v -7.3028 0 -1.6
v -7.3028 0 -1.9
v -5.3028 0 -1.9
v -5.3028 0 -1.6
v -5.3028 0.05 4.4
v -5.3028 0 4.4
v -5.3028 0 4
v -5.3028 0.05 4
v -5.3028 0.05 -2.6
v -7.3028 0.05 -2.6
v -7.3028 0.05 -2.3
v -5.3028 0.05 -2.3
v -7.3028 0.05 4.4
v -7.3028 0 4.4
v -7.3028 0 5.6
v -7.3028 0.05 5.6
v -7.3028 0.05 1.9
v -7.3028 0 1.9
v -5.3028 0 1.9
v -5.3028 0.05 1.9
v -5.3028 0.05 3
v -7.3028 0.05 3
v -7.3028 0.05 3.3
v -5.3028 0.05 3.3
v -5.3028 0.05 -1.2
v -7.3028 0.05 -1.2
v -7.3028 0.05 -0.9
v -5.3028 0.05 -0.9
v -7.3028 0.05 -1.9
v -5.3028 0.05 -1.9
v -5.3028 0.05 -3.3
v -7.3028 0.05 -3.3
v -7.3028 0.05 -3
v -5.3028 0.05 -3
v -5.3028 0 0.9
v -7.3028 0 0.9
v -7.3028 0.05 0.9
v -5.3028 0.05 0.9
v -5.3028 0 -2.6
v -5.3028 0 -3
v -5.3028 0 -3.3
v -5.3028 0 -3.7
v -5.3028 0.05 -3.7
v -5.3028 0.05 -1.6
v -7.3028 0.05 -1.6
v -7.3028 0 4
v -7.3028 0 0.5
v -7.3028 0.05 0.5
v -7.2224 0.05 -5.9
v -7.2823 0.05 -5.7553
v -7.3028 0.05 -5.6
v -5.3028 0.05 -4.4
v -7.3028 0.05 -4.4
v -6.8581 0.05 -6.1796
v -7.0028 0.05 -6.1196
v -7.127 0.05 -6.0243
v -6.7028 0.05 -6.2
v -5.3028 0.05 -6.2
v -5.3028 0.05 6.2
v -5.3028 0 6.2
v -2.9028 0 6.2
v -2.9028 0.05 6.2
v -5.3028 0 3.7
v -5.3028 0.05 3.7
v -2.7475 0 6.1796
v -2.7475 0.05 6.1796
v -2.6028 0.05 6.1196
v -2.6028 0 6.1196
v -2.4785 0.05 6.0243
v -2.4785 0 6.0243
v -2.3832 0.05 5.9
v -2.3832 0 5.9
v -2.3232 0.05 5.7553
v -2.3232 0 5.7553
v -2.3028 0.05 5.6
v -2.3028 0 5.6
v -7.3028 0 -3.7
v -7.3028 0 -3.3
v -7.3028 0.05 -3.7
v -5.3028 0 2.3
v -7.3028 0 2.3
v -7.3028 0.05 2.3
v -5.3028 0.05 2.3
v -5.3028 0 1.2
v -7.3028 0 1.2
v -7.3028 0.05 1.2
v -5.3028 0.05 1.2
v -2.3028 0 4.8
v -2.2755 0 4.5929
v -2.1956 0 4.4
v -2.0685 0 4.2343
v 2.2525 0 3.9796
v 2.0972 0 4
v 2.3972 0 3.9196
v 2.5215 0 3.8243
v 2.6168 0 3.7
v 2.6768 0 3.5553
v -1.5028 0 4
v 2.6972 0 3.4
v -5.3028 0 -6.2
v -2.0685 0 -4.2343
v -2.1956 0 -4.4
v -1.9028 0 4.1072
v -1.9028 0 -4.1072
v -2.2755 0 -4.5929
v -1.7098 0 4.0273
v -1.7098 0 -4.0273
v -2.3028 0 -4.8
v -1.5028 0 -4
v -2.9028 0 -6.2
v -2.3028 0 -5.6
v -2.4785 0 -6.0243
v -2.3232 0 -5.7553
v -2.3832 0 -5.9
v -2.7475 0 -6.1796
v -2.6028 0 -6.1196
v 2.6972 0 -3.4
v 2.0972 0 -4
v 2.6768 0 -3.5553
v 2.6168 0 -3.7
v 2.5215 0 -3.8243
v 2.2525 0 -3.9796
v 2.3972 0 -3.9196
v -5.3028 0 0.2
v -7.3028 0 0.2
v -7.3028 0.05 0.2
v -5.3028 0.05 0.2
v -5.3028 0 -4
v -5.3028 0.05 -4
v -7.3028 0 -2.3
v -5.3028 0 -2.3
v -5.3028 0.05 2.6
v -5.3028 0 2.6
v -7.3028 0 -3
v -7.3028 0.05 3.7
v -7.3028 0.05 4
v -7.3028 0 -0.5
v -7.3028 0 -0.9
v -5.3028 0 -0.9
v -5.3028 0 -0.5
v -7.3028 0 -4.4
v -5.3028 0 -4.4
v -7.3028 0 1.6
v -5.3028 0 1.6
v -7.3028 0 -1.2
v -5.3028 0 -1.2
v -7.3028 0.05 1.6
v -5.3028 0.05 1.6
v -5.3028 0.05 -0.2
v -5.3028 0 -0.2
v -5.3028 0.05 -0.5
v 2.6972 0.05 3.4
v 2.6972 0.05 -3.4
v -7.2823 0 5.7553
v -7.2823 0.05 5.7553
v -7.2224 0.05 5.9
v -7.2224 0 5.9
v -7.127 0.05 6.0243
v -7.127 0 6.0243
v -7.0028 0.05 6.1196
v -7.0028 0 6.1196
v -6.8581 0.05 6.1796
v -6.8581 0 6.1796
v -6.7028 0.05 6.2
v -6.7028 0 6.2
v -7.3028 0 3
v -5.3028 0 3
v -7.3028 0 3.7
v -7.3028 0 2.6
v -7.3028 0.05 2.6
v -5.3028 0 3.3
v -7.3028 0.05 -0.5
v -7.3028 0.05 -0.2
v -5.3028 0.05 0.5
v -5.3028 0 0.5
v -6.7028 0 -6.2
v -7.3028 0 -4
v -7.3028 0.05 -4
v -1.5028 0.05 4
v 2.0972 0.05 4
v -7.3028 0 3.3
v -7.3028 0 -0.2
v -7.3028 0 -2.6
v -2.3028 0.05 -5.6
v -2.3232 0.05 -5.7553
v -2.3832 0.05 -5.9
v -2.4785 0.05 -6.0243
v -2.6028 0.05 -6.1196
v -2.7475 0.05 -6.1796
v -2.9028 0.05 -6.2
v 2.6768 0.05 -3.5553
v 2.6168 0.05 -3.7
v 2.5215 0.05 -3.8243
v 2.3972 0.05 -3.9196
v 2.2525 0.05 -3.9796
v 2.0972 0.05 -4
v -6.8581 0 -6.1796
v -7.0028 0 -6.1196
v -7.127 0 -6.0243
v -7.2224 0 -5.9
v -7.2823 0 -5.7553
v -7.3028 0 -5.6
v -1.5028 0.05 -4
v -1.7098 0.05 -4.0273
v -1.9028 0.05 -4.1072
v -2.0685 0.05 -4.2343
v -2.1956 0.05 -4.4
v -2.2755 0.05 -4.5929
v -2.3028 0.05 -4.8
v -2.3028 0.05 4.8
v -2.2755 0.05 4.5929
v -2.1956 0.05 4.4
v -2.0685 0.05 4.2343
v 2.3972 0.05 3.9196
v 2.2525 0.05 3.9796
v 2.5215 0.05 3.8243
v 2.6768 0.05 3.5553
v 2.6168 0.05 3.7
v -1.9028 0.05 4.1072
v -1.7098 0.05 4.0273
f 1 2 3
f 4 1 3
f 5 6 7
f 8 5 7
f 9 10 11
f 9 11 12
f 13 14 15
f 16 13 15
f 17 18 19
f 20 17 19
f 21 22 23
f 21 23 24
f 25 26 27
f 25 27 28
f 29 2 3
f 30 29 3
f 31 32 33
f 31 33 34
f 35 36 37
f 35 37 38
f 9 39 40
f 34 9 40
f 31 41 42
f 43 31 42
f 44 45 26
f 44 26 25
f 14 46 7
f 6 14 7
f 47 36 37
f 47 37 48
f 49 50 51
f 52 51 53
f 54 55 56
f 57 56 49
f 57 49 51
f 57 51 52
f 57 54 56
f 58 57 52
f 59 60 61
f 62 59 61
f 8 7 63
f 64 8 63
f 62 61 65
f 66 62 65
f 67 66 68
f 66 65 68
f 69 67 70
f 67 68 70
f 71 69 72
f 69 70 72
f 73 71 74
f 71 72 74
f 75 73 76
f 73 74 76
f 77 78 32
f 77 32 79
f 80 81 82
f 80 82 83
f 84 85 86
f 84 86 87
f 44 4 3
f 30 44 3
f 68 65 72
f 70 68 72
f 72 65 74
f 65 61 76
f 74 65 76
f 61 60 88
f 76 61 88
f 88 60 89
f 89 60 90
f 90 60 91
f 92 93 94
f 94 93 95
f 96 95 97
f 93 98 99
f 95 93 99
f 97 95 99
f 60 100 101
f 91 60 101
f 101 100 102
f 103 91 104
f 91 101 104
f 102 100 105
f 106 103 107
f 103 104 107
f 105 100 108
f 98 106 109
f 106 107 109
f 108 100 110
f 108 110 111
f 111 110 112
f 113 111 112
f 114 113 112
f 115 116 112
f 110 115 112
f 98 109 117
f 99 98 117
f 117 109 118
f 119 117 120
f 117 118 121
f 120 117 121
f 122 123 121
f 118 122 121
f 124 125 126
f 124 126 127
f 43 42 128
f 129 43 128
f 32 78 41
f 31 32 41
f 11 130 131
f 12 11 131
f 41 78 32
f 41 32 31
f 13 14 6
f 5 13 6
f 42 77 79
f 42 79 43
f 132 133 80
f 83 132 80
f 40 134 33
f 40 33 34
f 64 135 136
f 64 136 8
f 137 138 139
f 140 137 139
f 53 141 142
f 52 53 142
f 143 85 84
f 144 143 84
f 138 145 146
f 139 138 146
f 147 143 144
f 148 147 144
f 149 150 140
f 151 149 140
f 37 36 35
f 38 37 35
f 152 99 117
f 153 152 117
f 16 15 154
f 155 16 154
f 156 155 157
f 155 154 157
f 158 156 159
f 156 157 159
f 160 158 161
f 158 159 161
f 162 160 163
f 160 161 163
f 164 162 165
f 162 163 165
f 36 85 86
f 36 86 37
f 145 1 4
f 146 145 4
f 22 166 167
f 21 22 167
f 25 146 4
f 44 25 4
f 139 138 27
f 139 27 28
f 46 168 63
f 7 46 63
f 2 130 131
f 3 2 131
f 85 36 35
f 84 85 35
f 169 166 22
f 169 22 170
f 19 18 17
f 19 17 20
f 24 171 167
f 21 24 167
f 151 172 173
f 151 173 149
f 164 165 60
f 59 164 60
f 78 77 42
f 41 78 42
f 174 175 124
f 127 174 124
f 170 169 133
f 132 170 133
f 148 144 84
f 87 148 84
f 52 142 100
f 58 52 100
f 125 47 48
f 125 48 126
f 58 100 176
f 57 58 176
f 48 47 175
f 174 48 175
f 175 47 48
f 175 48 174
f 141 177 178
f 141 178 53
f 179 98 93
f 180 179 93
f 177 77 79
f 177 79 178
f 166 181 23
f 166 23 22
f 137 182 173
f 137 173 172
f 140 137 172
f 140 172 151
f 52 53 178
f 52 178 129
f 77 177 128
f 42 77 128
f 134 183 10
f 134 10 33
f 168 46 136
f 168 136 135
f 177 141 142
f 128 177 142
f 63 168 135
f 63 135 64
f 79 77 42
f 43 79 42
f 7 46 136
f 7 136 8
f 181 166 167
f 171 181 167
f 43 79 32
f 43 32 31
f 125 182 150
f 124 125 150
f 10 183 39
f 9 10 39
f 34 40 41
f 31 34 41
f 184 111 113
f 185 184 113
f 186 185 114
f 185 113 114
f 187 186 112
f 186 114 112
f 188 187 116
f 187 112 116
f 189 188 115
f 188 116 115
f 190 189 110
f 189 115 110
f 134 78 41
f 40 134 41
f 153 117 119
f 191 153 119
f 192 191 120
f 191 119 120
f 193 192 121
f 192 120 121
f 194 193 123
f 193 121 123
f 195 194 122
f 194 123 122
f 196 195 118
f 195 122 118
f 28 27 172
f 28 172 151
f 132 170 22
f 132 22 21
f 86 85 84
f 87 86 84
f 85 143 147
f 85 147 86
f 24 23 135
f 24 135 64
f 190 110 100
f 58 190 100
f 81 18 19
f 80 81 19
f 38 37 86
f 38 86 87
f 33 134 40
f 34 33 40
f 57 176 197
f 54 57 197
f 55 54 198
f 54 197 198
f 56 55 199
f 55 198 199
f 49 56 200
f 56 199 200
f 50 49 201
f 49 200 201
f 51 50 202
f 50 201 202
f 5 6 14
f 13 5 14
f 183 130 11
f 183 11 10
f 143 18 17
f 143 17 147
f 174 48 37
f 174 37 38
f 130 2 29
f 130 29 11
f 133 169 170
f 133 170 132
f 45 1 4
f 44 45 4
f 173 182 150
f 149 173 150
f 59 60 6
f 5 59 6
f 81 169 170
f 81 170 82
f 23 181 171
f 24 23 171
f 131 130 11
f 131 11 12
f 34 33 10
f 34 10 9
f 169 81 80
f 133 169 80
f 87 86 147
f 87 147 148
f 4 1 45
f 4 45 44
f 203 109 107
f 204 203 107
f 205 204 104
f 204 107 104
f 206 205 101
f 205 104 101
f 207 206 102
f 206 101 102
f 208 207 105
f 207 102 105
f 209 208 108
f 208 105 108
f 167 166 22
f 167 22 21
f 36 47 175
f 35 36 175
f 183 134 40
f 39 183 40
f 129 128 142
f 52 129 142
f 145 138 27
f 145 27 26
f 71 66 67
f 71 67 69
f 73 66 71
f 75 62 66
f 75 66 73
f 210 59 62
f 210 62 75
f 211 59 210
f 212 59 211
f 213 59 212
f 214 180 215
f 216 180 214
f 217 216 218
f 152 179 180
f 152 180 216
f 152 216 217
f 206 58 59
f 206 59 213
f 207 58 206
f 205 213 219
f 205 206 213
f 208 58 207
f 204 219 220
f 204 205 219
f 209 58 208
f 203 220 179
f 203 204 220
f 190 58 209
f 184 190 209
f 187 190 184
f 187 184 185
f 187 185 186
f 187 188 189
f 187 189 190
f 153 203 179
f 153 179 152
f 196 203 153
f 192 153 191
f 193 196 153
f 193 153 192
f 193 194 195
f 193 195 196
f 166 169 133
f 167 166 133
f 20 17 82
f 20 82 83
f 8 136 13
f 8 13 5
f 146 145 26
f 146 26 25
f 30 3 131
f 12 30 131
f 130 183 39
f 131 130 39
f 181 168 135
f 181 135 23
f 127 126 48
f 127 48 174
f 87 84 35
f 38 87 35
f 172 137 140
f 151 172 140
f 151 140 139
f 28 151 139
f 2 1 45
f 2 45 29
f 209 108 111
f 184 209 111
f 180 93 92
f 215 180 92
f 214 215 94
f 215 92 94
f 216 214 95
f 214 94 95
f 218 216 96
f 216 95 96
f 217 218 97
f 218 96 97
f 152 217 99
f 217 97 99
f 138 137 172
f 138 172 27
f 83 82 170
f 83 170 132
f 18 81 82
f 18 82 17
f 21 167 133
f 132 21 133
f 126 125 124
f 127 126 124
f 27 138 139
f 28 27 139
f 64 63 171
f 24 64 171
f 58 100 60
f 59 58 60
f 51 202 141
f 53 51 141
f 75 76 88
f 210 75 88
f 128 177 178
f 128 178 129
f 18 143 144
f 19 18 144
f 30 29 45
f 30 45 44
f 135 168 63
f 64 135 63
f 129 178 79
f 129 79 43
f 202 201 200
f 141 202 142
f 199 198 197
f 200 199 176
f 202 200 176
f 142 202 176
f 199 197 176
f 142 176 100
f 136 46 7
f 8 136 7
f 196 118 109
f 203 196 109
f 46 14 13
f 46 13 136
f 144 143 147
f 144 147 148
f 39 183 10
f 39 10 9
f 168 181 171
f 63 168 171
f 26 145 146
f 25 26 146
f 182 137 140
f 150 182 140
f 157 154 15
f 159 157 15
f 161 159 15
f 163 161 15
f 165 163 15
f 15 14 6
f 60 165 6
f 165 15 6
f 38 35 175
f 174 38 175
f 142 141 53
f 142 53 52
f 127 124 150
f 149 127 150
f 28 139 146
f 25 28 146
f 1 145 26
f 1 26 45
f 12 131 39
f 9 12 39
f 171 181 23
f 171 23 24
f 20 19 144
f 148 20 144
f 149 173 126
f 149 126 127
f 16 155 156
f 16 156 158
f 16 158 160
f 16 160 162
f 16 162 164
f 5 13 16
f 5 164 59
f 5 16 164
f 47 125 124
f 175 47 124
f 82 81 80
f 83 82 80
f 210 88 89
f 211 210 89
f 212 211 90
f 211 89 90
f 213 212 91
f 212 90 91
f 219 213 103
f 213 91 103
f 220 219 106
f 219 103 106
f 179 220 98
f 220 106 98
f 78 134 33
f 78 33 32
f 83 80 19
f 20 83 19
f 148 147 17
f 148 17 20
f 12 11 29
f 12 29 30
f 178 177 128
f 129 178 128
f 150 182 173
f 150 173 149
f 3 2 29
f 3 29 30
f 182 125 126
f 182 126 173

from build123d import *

# Parameters (mm, degrees)
EXTRUDE_1_DEPTH    = 0.05
SKETCH_1_3_W       = 2
SKETCH_1_3_H       = 0.4
EXTRUDE_2_DEPTH    = 0.05
EXTRUDE_2_2_DEPTH  = 0.05
EXTRUDE_2_3_DEPTH  = 0.05
EXTRUDE_2_4_DEPTH  = 0.05
EXTRUDE_2_5_DEPTH  = 0.05
EXTRUDE_2_6_DEPTH  = 0.05
EXTRUDE_2_7_DEPTH  = 0.05
EXTRUDE_2_8_DEPTH  = 0.05
EXTRUDE_2_9_DEPTH  = 0.05
EXTRUDE_2_10_DEPTH = 0.05
EXTRUDE_2_11_DEPTH = 0.05
EXTRUDE_2_12_DEPTH = 0.05
EXTRUDE_2_13_DEPTH = 0.05
EXTRUDE_3_DEPTH    = 0.05
SKETCH_1_5_W       = 2
SKETCH_1_5_H       = 0.3
EXTRUDE_3_2_DEPTH  = 0.05
EXTRUDE_3_3_DEPTH  = 0.05
EXTRUDE_3_4_DEPTH  = 0.05
EXTRUDE_3_5_DEPTH  = 0.05
EXTRUDE_3_6_DEPTH  = 0.05
EXTRUDE_3_7_DEPTH  = 0.05
EXTRUDE_3_8_DEPTH  = 0.05
EXTRUDE_3_9_DEPTH  = 0.05
EXTRUDE_3_10_DEPTH = 0.05
EXTRUDE_3_11_DEPTH = 0.05
EXTRUDE_3_12_DEPTH = 0.05
EXTRUDE_3_13_DEPTH = 0.05
EXTRUDE_3_14_DEPTH = 0.05


with BuildPart() as part:
    # 草图1 → 凸台-拉伸1 (new body)
    with BuildSketch(Plane(origin=(0, 0, 0), x_dir=(1, 0, 0), z_dir=(0, 1, 0))):
        with BuildLine():
            Line((-5.302780917, 1.2), (-5.302780917, 0.9))
            Line((-5.302780917, 0.9), (-5.302780917, 0.5))
            Line((-5.302780917, 0.5), (-5.302780917, 0.2))
            Line((-5.302780917, 0.2), (-5.302780917, -0.2))
            Line((-5.302780917, -0.2), (-5.302780917, -0.5))
            Line((-5.302780917, -0.5), (-5.302780917, -0.9))
            Line((-5.302780917, -0.9), (-5.302780917, -1.2))
            Line((-5.302780917, -1.2), (-5.302780917, -1.6))
            Line((-5.302780917, -1.6), (-5.302780917, -1.9))
            Line((-5.302780917, -1.9), (-5.302780917, -2.3))
            Line((-5.302780917, -2.3), (-5.302780917, -2.6))
            Line((-5.302780917, -2.6), (-5.302780917, -3))
            Line((-5.302780917, -3), (-5.302780917, -3.3))
            Line((-5.302780917, -3.3), (-5.302780917, -3.7))
            Line((-5.302780917, -3.7), (-5.302780917, -4))
            Line((-5.302780917, -4), (-5.302780917, -4.4))
            Line((-5.302780917, -4.4), (-5.302780917, -6.2))
            Line((-5.302780917, -6.2), (-2.902780917, -6.2))
            ThreePointArc((-2.902780917, -6.2), (-2.478516848, -6.024264069), (-2.302780917, -5.6))
            Line((-2.302780917, -5.6), (-2.302780917, -4.8))
            ThreePointArc((-2.302780917, -4.8), (-2.068466342, -4.234314575), (-1.502780917, -4))
            Line((-1.502780917, -4), (2.097219083, -4))
            ThreePointArc((2.097219083, -4), (2.521483152, -3.824264069), (2.697219083, -3.4))
            Line((2.697219083, -3.4), (2.697219083, 3.4))
            ThreePointArc((2.697219083, 3.4), (2.521483152, 3.824264069), (2.097219083, 4))
            Line((2.097219083, 4), (-1.502780917, 4))
            ThreePointArc((-1.502780917, 4), (-2.068466342, 4.234314575), (-2.302780917, 4.8))
            Line((-2.302780917, 4.8), (-2.302780917, 5.6))
            ThreePointArc((-2.302780917, 5.6), (-2.478516848, 6.024264069), (-2.902780917, 6.2))
            Line((-2.902780917, 6.2), (-5.302780917, 6.2))
            Line((-5.302780917, 6.2), (-5.302780917, 4.4))
            Line((-5.302780917, 4.4), (-5.302780917, 4))
            Line((-5.302780917, 4), (-5.302780917, 3.7))
            Line((-5.302780917, 3.7), (-5.302780917, 3.3))
            Line((-5.302780917, 3.3), (-5.302780917, 3))
            Line((-5.302780917, 3), (-5.302780917, 2.6))
            Line((-5.302780917, 2.6), (-5.302780917, 2.3))
            Line((-5.302780917, 2.3), (-5.302780917, 1.9))
            Line((-5.302780917, 1.9), (-5.302780917, 1.6))
            Line((-5.302780917, 1.6), (-5.302780917, 1.2))
        make_face()
    extrude(amount=EXTRUDE_1_DEPTH)


with BuildPart() as body_2:
    # 草图1<3> → 凸台-拉伸2 (new body)
    with BuildSketch(Plane(origin=(0, 0, 0), x_dir=(1, 0, 0), z_dir=(0, 1, 0))):
        with Locations((-6.302780917, 4.2)):
            Rectangle(SKETCH_1_3_W, SKETCH_1_3_H)
    extrude(amount=EXTRUDE_2_DEPTH)


with BuildPart() as body_3:
    # 草图1<3> → Extrude 2 2 (new body)
    with BuildSketch(Plane(origin=(0, 0, 0), x_dir=(1, 0, 0), z_dir=(0, 1, 0))):
        with Locations((-6.302780917, 3.5)):
            Rectangle(SKETCH_1_3_W, SKETCH_1_3_H)
    extrude(amount=EXTRUDE_2_2_DEPTH)


with BuildPart() as body_4:
    # 草图1<3> → Extrude 2 3 (new body)
    with BuildSketch(Plane(origin=(0, 0, 0), x_dir=(1, 0, 0), z_dir=(0, 1, 0))):
        with Locations((-6.302780917, 2.8)):
            Rectangle(SKETCH_1_3_W, SKETCH_1_3_H)
    extrude(amount=EXTRUDE_2_3_DEPTH)


with BuildPart() as body_5:
    # 草图1<3> → Extrude 2 4 (new body)
    with BuildSketch(Plane(origin=(0, 0, 0), x_dir=(1, 0, 0), z_dir=(0, 1, 0))):
        with Locations((-6.302780917, 2.1)):
            Rectangle(SKETCH_1_3_W, SKETCH_1_3_H)
    extrude(amount=EXTRUDE_2_4_DEPTH)


with BuildPart() as body_6:
    # 草图1<3> → Extrude 2 5 (new body)
    with BuildSketch(Plane(origin=(0, 0, 0), x_dir=(1, 0, 0), z_dir=(0, 1, 0))):
        with Locations((-6.302780917, 1.4)):
            Rectangle(SKETCH_1_3_W, SKETCH_1_3_H)
    extrude(amount=EXTRUDE_2_5_DEPTH)


with BuildPart() as body_7:
    # 草图1<3> → Extrude 2 6 (new body)
    with BuildSketch(Plane(origin=(0, 0, 0), x_dir=(1, 0, 0), z_dir=(0, 1, 0))):
        with Locations((-6.302780917, 0.7)):
            Rectangle(SKETCH_1_3_W, SKETCH_1_3_H)
    extrude(amount=EXTRUDE_2_6_DEPTH)


with BuildPart() as body_8:
    # 草图1<3> → Extrude 2 7 (new body)
    with BuildSketch(Plane(origin=(0, 0, 0), x_dir=(1, 0, 0), z_dir=(0, 1, 0))):
        with Locations((-6.302780917, 0)):
            Rectangle(SKETCH_1_3_W, SKETCH_1_3_H)
    extrude(amount=EXTRUDE_2_7_DEPTH)


with BuildPart() as body_9:
    # 草图1<3> → Extrude 2 8 (new body)
    with BuildSketch(Plane(origin=(0, 0, 0), x_dir=(1, 0, 0), z_dir=(0, 1, 0))):
        with Locations((-6.302780917, -0.7)):
            Rectangle(SKETCH_1_3_W, SKETCH_1_3_H)
    extrude(amount=EXTRUDE_2_8_DEPTH)


with BuildPart() as body_10:
    # 草图1<3> → Extrude 2 9 (new body)
    with BuildSketch(Plane(origin=(0, 0, 0), x_dir=(1, 0, 0), z_dir=(0, 1, 0))):
        with Locations((-6.302780917, -1.4)):
            Rectangle(SKETCH_1_3_W, SKETCH_1_3_H)
    extrude(amount=EXTRUDE_2_9_DEPTH)


with BuildPart() as body_11:
    # 草图1<3> → Extrude 2 10 (new body)
    with BuildSketch(Plane(origin=(0, 0, 0), x_dir=(1, 0, 0), z_dir=(0, 1, 0))):
        with Locations((-6.302780917, -2.1)):
            Rectangle(SKETCH_1_3_W, SKETCH_1_3_H)
    extrude(amount=EXTRUDE_2_10_DEPTH)


with BuildPart() as body_12:
    # 草图1<3> → Extrude 2 11 (new body)
    with BuildSketch(Plane(origin=(0, 0, 0), x_dir=(1, 0, 0), z_dir=(0, 1, 0))):
        with Locations((-6.302780917, -2.8)):
            Rectangle(SKETCH_1_3_W, SKETCH_1_3_H)
    extrude(amount=EXTRUDE_2_11_DEPTH)


with BuildPart() as body_13:
    # 草图1<3> → Extrude 2 12 (new body)
    with BuildSketch(Plane(origin=(0, 0, 0), x_dir=(1, 0, 0), z_dir=(0, 1, 0))):
        with Locations((-6.302780917, -3.5)):
            Rectangle(SKETCH_1_3_W, SKETCH_1_3_H)
    extrude(amount=EXTRUDE_2_12_DEPTH)


with BuildPart() as body_14:
    # 草图1<3> → Extrude 2 13 (new body)
    with BuildSketch(Plane(origin=(0, 0, 0), x_dir=(1, 0, 0), z_dir=(0, 1, 0))):
        with Locations((-6.302780917, -4.2)):
            Rectangle(SKETCH_1_3_W, SKETCH_1_3_H)
    extrude(amount=EXTRUDE_2_13_DEPTH)


with BuildPart() as body_15:
    # 草图1<5> → 凸台-拉伸3 (new body)
    with BuildSketch(Plane(origin=(0, 0, 0), x_dir=(1, 0, 0), z_dir=(0, 1, 0))):
        with BuildLine():
            Line((-5.302780917, -4.4), (-7.302780917, -4.4))
            Line((-7.302780917, -4.4), (-7.302780917, -5.6))
            ThreePointArc((-7.302780917, -5.6), (-7.127044986, -6.024264069), (-6.702780917, -6.2))
            Line((-6.702780917, -6.2), (-5.302780917, -6.2))
            Line((-5.302780917, -6.2), (-5.302780917, -4.4))
        make_face()
    extrude(amount=EXTRUDE_3_DEPTH)


with BuildPart() as body_16:
    # 草图1<5> → Extrude 3 2 (new body)
    with BuildSketch(Plane(origin=(0, 0, 0), x_dir=(1, 0, 0), z_dir=(0, 1, 0))):
        with Locations((-6.302780917, -3.85)):
            Rectangle(SKETCH_1_5_W, SKETCH_1_5_H)
    extrude(amount=EXTRUDE_3_2_DEPTH)


with BuildPart() as body_17:
    # 草图1<5> → Extrude 3 3 (new body)
    with BuildSketch(Plane(origin=(0, 0, 0), x_dir=(1, 0, 0), z_dir=(0, 1, 0))):
        with Locations((-6.302780917, -3.15)):
            Rectangle(SKETCH_1_5_W, SKETCH_1_5_H)
    extrude(amount=EXTRUDE_3_3_DEPTH)


with BuildPart() as body_18:
    # 草图1<5> → Extrude 3 4 (new body)
    with BuildSketch(Plane(origin=(0, 0, 0), x_dir=(1, 0, 0), z_dir=(0, 1, 0))):
        with Locations((-6.302780917, -2.45)):
            Rectangle(SKETCH_1_5_W, SKETCH_1_5_H)
    extrude(amount=EXTRUDE_3_4_DEPTH)


with BuildPart() as body_19:
    # 草图1<5> → Extrude 3 5 (new body)
    with BuildSketch(Plane(origin=(0, 0, 0), x_dir=(1, 0, 0), z_dir=(0, 1, 0))):
        with Locations((-6.302780917, -1.75)):
            Rectangle(SKETCH_1_5_W, SKETCH_1_5_H)
    extrude(amount=EXTRUDE_3_5_DEPTH)


with BuildPart() as body_20:
    # 草图1<5> → Extrude 3 6 (new body)
    with BuildSketch(Plane(origin=(0, 0, 0), x_dir=(1, 0, 0), z_dir=(0, 1, 0))):
        with Locations((-6.302780917, -1.05)):
            Rectangle(SKETCH_1_5_W, SKETCH_1_5_H)
    extrude(amount=EXTRUDE_3_6_DEPTH)


with BuildPart() as body_21:
    # 草图1<5> → Extrude 3 7 (new body)
    with BuildSketch(Plane(origin=(0, 0, 0), x_dir=(1, 0, 0), z_dir=(0, 1, 0))):
        with Locations((-6.302780917, -0.35)):
            Rectangle(SKETCH_1_5_W, SKETCH_1_5_H)
    extrude(amount=EXTRUDE_3_7_DEPTH)


with BuildPart() as body_22:
    # 草图1<5> → Extrude 3 8 (new body)
    with BuildSketch(Plane(origin=(0, 0, 0), x_dir=(1, 0, 0), z_dir=(0, 1, 0))):
        with Locations((-6.302780917, 0.35)):
            Rectangle(SKETCH_1_5_W, SKETCH_1_5_H)
    extrude(amount=EXTRUDE_3_8_DEPTH)


with BuildPart() as body_23:
    # 草图1<5> → Extrude 3 9 (new body)
    with BuildSketch(Plane(origin=(0, 0, 0), x_dir=(1, 0, 0), z_dir=(0, 1, 0))):
        with Locations((-6.302780917, 1.05)):
            Rectangle(SKETCH_1_5_W, SKETCH_1_5_H)
    extrude(amount=EXTRUDE_3_9_DEPTH)


with BuildPart() as body_24:
    # 草图1<5> → Extrude 3 10 (new body)
    with BuildSketch(Plane(origin=(0, 0, 0), x_dir=(1, 0, 0), z_dir=(0, 1, 0))):
        with Locations((-6.302780917, 1.75)):
            Rectangle(SKETCH_1_5_W, SKETCH_1_5_H)
    extrude(amount=EXTRUDE_3_10_DEPTH)


with BuildPart() as body_25:
    # 草图1<5> → Extrude 3 11 (new body)
    with BuildSketch(Plane(origin=(0, 0, 0), x_dir=(1, 0, 0), z_dir=(0, 1, 0))):
        with BuildLine():
            Line((-7.302780917, 5.6), (-7.302780917, 4.4))
            Line((-7.302780917, 4.4), (-5.302780917, 4.4))
            Line((-5.302780917, 4.4), (-5.302780917, 6.2))
            Line((-5.302780917, 6.2), (-6.702780917, 6.2))
            ThreePointArc((-6.702780917, 6.2), (-7.127044986, 6.024264069), (-7.302780917, 5.6))
        make_face()
    extrude(amount=EXTRUDE_3_11_DEPTH)


with BuildPart() as body_26:
    # 草图1<5> → Extrude 3 12 (new body)
    with BuildSketch(Plane(origin=(0, 0, 0), x_dir=(1, 0, 0), z_dir=(0, 1, 0))):
        with Locations((-6.302780917, 3.85)):
            Rectangle(SKETCH_1_5_W, SKETCH_1_5_H)
    extrude(amount=EXTRUDE_3_12_DEPTH)


with BuildPart() as body_27:
    # 草图1<5> → Extrude 3 13 (new body)
    with BuildSketch(Plane(origin=(0, 0, 0), x_dir=(1, 0, 0), z_dir=(0, 1, 0))):
        with Locations((-6.302780917, 3.15)):
            Rectangle(SKETCH_1_5_W, SKETCH_1_5_H)
    extrude(amount=EXTRUDE_3_13_DEPTH)


with BuildPart() as body_28:
    # 草图1<5> → Extrude 3 14 (new body)
    with BuildSketch(Plane(origin=(0, 0, 0), x_dir=(1, 0, 0), z_dir=(0, 1, 0))):
        with Locations((-6.302780917, 2.45)):
            Rectangle(SKETCH_1_5_W, SKETCH_1_5_H)
    extrude(amount=EXTRUDE_3_14_DEPTH)


solid = Compound([part.part, body_2.part, body_3.part, body_4.part, body_5.part, body_6.part, body_7.part, body_8.part, body_9.part, body_10.part, body_11.part, body_12.part, body_13.part, body_14.part, body_15.part, body_16.part, body_17.part, body_18.part, body_19.part, body_20.part, body_21.part, body_22.part, body_23.part, body_24.part, body_25.part, body_26.part, body_27.part, body_28.part])
